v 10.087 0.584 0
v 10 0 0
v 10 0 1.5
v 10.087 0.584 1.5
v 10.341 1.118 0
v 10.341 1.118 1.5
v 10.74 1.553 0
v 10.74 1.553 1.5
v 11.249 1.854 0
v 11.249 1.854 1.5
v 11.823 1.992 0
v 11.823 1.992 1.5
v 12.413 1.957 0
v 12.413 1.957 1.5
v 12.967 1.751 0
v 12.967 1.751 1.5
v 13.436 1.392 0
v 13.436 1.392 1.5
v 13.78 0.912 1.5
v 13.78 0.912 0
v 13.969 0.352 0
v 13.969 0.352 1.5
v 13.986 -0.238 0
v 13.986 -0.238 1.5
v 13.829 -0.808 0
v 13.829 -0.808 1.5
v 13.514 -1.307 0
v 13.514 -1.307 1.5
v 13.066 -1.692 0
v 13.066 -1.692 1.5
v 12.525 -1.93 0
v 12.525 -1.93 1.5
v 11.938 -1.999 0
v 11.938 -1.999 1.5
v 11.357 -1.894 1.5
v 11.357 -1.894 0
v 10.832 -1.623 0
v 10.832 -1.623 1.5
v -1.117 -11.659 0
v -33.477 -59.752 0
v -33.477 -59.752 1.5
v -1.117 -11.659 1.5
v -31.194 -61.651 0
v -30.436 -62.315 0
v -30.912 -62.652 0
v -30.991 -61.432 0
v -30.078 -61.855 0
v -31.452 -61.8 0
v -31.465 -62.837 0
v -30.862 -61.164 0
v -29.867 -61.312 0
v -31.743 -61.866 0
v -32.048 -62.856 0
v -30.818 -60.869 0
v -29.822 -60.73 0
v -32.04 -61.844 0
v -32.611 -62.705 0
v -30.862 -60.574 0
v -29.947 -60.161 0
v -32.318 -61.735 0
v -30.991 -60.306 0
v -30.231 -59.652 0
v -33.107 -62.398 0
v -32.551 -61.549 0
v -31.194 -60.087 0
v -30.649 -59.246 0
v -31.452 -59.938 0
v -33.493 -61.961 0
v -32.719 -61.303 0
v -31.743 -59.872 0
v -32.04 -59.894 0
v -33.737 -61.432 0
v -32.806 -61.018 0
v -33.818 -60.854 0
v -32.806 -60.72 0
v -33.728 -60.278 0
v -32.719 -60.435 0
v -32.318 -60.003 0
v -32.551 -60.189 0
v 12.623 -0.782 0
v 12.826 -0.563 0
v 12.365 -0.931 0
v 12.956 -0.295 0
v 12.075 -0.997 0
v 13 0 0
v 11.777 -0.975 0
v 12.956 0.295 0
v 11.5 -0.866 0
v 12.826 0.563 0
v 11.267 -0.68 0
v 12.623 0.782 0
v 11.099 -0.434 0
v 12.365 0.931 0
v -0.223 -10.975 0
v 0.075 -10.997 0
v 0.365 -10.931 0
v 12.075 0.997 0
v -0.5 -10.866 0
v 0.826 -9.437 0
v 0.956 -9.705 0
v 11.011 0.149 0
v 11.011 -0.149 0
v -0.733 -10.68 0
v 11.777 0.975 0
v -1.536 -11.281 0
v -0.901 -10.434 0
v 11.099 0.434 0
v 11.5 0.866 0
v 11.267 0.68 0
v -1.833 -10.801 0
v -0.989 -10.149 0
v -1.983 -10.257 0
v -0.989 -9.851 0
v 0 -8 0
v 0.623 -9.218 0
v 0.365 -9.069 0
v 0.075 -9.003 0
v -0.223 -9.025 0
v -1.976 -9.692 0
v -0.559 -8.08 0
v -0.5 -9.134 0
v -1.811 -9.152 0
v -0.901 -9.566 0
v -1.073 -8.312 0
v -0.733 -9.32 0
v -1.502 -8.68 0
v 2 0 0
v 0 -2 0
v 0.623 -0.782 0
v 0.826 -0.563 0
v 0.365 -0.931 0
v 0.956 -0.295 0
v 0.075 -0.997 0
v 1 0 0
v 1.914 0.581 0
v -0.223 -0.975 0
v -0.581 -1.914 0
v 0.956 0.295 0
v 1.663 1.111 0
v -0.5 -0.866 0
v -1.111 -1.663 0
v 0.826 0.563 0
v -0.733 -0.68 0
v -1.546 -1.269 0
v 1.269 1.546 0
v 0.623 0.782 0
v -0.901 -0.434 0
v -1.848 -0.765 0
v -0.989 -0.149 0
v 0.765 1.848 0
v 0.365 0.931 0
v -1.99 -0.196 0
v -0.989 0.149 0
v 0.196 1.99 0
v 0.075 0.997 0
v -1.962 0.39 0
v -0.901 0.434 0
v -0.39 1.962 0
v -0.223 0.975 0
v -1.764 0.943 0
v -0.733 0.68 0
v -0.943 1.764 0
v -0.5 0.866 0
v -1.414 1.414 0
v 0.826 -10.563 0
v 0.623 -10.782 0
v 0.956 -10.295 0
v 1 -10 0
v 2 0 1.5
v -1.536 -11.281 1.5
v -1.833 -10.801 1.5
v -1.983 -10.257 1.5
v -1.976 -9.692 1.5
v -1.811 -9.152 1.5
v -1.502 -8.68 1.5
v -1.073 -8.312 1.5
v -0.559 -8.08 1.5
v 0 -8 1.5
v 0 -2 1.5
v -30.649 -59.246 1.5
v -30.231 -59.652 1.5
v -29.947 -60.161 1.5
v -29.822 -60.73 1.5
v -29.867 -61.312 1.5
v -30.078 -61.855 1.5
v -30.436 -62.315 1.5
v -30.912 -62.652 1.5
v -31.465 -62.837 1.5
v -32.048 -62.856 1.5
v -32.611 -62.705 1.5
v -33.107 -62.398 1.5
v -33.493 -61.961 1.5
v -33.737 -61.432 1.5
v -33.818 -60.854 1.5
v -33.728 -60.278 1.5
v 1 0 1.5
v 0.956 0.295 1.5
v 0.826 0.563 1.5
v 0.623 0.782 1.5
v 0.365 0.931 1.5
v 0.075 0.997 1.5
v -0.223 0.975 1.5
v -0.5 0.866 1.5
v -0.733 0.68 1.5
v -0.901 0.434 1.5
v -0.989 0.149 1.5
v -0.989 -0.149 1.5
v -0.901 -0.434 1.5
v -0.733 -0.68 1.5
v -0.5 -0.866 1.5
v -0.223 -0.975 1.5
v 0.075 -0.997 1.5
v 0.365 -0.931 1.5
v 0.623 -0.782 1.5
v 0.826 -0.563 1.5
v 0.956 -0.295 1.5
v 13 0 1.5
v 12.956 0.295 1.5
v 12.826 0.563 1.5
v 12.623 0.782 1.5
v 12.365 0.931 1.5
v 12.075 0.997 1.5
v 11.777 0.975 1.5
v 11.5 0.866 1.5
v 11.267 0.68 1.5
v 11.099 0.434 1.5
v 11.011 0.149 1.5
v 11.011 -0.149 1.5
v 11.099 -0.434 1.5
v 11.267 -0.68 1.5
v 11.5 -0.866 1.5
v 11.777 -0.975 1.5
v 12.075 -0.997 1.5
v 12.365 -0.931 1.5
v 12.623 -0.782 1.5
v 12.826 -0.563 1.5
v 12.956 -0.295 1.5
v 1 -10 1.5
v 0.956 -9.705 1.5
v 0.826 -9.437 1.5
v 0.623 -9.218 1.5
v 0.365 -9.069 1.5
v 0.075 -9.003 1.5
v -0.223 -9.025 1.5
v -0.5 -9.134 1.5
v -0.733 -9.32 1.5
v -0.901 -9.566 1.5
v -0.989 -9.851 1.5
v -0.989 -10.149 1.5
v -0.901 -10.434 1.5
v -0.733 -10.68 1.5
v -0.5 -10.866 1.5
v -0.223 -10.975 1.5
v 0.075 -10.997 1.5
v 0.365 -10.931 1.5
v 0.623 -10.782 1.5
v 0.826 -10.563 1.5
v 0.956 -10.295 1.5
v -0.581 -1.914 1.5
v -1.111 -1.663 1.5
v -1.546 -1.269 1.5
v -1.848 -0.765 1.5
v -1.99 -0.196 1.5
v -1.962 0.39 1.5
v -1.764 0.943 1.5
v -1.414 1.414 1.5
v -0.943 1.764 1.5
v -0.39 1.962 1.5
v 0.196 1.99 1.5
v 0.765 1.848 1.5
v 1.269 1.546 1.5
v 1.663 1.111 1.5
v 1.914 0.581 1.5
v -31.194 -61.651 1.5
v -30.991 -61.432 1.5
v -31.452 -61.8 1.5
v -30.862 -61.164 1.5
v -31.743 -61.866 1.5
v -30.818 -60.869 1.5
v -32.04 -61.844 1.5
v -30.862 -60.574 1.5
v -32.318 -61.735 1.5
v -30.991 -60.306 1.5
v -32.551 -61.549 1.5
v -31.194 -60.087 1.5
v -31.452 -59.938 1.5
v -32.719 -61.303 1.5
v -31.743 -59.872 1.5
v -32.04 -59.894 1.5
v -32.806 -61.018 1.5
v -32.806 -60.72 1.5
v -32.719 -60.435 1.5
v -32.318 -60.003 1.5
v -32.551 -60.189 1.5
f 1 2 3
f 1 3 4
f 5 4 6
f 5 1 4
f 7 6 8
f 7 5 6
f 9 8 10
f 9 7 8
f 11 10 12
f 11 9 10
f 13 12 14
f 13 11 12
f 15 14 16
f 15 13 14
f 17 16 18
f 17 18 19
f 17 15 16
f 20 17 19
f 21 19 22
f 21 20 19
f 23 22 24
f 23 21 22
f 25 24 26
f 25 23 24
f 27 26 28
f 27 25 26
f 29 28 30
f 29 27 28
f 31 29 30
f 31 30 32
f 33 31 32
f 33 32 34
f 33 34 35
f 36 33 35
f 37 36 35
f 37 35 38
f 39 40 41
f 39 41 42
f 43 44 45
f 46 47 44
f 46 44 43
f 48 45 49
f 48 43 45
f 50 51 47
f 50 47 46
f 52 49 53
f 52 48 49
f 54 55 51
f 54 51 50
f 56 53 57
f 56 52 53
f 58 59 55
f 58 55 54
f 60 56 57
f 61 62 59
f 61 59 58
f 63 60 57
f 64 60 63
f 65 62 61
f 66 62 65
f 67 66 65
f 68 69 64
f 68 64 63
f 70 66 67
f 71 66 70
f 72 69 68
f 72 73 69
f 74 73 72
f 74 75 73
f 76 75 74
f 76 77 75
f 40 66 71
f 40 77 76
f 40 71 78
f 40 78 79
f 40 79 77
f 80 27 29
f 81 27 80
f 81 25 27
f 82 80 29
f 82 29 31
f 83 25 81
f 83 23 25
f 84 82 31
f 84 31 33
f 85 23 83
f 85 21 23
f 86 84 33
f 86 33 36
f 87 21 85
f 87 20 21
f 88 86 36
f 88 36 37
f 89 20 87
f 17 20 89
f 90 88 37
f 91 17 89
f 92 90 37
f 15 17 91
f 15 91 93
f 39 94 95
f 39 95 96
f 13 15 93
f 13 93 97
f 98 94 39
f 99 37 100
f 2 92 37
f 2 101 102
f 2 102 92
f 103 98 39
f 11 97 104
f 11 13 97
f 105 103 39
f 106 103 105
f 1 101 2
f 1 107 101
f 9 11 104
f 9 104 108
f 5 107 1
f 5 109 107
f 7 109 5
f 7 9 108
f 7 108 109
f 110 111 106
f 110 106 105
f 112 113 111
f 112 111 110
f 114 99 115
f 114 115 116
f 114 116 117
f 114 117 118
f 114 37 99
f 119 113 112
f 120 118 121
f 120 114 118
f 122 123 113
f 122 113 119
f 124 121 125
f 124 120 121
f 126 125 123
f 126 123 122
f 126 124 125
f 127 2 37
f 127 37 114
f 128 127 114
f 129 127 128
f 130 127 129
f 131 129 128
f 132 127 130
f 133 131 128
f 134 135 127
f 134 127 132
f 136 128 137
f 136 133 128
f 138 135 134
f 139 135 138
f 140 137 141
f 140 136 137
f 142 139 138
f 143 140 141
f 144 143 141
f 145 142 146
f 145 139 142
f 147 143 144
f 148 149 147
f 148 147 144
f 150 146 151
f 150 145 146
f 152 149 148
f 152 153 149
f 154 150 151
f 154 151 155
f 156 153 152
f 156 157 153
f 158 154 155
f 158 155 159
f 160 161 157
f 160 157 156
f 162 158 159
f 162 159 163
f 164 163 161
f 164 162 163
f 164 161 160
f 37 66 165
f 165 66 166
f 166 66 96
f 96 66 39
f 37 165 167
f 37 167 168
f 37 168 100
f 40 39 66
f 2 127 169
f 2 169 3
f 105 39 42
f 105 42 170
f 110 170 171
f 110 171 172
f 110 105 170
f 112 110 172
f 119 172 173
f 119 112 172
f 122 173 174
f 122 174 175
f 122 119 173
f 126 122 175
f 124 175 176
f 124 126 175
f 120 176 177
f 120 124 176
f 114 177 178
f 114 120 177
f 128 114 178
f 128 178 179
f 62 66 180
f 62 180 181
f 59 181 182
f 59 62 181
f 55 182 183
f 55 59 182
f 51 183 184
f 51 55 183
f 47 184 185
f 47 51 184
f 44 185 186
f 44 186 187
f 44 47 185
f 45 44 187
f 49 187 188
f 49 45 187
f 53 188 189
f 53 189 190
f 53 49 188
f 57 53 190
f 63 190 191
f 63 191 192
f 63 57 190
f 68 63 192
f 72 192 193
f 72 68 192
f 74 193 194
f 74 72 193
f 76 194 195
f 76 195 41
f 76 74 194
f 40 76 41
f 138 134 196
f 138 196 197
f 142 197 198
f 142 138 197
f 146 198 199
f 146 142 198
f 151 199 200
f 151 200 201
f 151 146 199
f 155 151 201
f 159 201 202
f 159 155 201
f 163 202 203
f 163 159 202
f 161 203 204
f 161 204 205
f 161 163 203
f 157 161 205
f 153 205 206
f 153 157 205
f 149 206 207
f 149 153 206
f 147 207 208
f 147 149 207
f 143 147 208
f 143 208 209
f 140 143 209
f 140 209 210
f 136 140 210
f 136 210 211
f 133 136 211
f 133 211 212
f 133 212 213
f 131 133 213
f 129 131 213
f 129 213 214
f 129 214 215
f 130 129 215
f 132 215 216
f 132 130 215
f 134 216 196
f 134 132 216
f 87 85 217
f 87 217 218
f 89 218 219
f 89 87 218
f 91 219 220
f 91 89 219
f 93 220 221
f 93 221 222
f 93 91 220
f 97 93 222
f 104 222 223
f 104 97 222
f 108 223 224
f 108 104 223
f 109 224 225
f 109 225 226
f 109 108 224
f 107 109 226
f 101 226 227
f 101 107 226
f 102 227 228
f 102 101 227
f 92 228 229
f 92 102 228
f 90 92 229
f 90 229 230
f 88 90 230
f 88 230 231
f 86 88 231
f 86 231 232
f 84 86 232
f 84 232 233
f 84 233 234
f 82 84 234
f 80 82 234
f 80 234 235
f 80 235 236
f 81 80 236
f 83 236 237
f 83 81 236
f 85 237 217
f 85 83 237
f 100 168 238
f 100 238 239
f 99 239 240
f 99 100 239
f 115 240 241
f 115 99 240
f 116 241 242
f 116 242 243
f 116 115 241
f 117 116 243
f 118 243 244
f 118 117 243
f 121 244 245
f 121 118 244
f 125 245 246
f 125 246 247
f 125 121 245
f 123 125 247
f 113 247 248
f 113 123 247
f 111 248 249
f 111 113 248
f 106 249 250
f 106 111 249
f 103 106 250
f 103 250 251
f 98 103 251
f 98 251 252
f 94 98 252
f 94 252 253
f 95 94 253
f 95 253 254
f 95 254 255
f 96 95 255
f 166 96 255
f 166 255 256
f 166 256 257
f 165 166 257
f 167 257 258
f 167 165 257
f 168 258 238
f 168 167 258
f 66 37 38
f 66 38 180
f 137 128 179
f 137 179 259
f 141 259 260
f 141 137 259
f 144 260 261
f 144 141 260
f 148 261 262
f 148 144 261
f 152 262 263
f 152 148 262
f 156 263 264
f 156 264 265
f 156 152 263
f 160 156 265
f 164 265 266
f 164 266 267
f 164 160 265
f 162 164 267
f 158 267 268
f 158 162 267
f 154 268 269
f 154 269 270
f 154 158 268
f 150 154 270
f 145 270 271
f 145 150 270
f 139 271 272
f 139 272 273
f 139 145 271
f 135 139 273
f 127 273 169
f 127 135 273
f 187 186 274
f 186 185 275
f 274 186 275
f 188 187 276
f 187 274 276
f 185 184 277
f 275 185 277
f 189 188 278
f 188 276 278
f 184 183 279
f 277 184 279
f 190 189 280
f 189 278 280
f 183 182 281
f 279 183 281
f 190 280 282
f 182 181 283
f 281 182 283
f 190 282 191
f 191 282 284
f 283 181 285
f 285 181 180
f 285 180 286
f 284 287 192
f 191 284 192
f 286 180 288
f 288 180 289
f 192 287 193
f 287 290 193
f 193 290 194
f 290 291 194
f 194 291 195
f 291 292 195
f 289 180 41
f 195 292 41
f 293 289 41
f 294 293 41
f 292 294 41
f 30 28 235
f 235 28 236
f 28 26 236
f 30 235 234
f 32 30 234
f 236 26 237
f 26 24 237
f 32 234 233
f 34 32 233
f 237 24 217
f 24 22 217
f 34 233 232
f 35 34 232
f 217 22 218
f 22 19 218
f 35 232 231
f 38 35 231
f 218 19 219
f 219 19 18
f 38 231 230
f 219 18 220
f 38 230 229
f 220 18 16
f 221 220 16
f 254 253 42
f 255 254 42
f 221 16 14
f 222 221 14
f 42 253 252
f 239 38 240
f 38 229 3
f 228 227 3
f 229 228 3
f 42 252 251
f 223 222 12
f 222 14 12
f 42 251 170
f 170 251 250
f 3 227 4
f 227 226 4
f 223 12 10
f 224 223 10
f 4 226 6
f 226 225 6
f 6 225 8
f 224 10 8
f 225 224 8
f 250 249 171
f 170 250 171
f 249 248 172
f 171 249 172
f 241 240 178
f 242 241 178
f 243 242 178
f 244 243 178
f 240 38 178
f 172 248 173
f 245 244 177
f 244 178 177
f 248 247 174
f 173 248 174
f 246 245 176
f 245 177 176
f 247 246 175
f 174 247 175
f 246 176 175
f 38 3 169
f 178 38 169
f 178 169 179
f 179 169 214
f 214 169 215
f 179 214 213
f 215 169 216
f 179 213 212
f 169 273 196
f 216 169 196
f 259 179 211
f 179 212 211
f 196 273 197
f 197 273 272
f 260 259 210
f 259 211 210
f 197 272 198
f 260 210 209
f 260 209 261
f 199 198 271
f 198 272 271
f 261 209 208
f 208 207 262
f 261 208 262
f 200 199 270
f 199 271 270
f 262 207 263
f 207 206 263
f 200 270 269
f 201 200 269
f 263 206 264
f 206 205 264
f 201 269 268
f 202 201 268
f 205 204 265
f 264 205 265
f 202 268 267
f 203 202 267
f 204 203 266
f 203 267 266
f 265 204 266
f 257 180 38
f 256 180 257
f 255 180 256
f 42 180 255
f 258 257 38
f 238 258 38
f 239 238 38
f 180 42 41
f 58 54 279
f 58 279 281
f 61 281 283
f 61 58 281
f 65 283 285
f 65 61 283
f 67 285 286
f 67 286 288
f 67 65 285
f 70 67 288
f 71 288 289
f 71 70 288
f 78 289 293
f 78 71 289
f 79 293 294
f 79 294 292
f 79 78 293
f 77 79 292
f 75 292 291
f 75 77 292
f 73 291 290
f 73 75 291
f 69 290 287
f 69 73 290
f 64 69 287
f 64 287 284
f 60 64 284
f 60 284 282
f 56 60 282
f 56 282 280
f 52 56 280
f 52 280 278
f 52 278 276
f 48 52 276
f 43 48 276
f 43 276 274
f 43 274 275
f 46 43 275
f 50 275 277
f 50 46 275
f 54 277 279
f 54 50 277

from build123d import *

# Parameters (mm, degrees)
SKETCH_1_R      = 1
EXTRUDE_1_DEPTH = 1.5


with BuildPart() as part:
    # 草图1 → 凸台-拉伸1 (new body)
    with BuildSketch(Plane.XY):
        with BuildLine():
            Line((10.83152947, -1.623168698), (-30.649174333, -59.245657467))
            ThreePointArc((-30.649174333, -59.245657467), (-31.464927374, -62.837478083), (-33.476977186, -59.752306464))
            Line((-33.476977186, -59.752306464), (-1.116519701, -11.659332323))
            ThreePointArc((-1.116519701, -11.659332323), (-1.912938139, -9.416332563), (0, -8))
            Line((0, -8), (0, -2))
            ThreePointArc((0, -2), (-1.414213562, 1.414213562), (2, 0))
            Line((2, 0), (10, 0))
            ThreePointArc((10, 0), (13.780019812, 0.911882377), (10.83152947, -1.623168698))
        make_face()
        with Locations((-31.817644863, -60.868826165)):
            Circle(SKETCH_1_R, mode=Mode.SUBTRACT)
        Circle(SKETCH_1_R, mode=Mode.SUBTRACT)
        with Locations((12, 0)):
            Circle(SKETCH_1_R, mode=Mode.SUBTRACT)
        with Locations((0, -10)):
            Circle(SKETCH_1_R, mode=Mode.SUBTRACT)
    extrude(amount=EXTRUDE_1_DEPTH)


solid = part.part
